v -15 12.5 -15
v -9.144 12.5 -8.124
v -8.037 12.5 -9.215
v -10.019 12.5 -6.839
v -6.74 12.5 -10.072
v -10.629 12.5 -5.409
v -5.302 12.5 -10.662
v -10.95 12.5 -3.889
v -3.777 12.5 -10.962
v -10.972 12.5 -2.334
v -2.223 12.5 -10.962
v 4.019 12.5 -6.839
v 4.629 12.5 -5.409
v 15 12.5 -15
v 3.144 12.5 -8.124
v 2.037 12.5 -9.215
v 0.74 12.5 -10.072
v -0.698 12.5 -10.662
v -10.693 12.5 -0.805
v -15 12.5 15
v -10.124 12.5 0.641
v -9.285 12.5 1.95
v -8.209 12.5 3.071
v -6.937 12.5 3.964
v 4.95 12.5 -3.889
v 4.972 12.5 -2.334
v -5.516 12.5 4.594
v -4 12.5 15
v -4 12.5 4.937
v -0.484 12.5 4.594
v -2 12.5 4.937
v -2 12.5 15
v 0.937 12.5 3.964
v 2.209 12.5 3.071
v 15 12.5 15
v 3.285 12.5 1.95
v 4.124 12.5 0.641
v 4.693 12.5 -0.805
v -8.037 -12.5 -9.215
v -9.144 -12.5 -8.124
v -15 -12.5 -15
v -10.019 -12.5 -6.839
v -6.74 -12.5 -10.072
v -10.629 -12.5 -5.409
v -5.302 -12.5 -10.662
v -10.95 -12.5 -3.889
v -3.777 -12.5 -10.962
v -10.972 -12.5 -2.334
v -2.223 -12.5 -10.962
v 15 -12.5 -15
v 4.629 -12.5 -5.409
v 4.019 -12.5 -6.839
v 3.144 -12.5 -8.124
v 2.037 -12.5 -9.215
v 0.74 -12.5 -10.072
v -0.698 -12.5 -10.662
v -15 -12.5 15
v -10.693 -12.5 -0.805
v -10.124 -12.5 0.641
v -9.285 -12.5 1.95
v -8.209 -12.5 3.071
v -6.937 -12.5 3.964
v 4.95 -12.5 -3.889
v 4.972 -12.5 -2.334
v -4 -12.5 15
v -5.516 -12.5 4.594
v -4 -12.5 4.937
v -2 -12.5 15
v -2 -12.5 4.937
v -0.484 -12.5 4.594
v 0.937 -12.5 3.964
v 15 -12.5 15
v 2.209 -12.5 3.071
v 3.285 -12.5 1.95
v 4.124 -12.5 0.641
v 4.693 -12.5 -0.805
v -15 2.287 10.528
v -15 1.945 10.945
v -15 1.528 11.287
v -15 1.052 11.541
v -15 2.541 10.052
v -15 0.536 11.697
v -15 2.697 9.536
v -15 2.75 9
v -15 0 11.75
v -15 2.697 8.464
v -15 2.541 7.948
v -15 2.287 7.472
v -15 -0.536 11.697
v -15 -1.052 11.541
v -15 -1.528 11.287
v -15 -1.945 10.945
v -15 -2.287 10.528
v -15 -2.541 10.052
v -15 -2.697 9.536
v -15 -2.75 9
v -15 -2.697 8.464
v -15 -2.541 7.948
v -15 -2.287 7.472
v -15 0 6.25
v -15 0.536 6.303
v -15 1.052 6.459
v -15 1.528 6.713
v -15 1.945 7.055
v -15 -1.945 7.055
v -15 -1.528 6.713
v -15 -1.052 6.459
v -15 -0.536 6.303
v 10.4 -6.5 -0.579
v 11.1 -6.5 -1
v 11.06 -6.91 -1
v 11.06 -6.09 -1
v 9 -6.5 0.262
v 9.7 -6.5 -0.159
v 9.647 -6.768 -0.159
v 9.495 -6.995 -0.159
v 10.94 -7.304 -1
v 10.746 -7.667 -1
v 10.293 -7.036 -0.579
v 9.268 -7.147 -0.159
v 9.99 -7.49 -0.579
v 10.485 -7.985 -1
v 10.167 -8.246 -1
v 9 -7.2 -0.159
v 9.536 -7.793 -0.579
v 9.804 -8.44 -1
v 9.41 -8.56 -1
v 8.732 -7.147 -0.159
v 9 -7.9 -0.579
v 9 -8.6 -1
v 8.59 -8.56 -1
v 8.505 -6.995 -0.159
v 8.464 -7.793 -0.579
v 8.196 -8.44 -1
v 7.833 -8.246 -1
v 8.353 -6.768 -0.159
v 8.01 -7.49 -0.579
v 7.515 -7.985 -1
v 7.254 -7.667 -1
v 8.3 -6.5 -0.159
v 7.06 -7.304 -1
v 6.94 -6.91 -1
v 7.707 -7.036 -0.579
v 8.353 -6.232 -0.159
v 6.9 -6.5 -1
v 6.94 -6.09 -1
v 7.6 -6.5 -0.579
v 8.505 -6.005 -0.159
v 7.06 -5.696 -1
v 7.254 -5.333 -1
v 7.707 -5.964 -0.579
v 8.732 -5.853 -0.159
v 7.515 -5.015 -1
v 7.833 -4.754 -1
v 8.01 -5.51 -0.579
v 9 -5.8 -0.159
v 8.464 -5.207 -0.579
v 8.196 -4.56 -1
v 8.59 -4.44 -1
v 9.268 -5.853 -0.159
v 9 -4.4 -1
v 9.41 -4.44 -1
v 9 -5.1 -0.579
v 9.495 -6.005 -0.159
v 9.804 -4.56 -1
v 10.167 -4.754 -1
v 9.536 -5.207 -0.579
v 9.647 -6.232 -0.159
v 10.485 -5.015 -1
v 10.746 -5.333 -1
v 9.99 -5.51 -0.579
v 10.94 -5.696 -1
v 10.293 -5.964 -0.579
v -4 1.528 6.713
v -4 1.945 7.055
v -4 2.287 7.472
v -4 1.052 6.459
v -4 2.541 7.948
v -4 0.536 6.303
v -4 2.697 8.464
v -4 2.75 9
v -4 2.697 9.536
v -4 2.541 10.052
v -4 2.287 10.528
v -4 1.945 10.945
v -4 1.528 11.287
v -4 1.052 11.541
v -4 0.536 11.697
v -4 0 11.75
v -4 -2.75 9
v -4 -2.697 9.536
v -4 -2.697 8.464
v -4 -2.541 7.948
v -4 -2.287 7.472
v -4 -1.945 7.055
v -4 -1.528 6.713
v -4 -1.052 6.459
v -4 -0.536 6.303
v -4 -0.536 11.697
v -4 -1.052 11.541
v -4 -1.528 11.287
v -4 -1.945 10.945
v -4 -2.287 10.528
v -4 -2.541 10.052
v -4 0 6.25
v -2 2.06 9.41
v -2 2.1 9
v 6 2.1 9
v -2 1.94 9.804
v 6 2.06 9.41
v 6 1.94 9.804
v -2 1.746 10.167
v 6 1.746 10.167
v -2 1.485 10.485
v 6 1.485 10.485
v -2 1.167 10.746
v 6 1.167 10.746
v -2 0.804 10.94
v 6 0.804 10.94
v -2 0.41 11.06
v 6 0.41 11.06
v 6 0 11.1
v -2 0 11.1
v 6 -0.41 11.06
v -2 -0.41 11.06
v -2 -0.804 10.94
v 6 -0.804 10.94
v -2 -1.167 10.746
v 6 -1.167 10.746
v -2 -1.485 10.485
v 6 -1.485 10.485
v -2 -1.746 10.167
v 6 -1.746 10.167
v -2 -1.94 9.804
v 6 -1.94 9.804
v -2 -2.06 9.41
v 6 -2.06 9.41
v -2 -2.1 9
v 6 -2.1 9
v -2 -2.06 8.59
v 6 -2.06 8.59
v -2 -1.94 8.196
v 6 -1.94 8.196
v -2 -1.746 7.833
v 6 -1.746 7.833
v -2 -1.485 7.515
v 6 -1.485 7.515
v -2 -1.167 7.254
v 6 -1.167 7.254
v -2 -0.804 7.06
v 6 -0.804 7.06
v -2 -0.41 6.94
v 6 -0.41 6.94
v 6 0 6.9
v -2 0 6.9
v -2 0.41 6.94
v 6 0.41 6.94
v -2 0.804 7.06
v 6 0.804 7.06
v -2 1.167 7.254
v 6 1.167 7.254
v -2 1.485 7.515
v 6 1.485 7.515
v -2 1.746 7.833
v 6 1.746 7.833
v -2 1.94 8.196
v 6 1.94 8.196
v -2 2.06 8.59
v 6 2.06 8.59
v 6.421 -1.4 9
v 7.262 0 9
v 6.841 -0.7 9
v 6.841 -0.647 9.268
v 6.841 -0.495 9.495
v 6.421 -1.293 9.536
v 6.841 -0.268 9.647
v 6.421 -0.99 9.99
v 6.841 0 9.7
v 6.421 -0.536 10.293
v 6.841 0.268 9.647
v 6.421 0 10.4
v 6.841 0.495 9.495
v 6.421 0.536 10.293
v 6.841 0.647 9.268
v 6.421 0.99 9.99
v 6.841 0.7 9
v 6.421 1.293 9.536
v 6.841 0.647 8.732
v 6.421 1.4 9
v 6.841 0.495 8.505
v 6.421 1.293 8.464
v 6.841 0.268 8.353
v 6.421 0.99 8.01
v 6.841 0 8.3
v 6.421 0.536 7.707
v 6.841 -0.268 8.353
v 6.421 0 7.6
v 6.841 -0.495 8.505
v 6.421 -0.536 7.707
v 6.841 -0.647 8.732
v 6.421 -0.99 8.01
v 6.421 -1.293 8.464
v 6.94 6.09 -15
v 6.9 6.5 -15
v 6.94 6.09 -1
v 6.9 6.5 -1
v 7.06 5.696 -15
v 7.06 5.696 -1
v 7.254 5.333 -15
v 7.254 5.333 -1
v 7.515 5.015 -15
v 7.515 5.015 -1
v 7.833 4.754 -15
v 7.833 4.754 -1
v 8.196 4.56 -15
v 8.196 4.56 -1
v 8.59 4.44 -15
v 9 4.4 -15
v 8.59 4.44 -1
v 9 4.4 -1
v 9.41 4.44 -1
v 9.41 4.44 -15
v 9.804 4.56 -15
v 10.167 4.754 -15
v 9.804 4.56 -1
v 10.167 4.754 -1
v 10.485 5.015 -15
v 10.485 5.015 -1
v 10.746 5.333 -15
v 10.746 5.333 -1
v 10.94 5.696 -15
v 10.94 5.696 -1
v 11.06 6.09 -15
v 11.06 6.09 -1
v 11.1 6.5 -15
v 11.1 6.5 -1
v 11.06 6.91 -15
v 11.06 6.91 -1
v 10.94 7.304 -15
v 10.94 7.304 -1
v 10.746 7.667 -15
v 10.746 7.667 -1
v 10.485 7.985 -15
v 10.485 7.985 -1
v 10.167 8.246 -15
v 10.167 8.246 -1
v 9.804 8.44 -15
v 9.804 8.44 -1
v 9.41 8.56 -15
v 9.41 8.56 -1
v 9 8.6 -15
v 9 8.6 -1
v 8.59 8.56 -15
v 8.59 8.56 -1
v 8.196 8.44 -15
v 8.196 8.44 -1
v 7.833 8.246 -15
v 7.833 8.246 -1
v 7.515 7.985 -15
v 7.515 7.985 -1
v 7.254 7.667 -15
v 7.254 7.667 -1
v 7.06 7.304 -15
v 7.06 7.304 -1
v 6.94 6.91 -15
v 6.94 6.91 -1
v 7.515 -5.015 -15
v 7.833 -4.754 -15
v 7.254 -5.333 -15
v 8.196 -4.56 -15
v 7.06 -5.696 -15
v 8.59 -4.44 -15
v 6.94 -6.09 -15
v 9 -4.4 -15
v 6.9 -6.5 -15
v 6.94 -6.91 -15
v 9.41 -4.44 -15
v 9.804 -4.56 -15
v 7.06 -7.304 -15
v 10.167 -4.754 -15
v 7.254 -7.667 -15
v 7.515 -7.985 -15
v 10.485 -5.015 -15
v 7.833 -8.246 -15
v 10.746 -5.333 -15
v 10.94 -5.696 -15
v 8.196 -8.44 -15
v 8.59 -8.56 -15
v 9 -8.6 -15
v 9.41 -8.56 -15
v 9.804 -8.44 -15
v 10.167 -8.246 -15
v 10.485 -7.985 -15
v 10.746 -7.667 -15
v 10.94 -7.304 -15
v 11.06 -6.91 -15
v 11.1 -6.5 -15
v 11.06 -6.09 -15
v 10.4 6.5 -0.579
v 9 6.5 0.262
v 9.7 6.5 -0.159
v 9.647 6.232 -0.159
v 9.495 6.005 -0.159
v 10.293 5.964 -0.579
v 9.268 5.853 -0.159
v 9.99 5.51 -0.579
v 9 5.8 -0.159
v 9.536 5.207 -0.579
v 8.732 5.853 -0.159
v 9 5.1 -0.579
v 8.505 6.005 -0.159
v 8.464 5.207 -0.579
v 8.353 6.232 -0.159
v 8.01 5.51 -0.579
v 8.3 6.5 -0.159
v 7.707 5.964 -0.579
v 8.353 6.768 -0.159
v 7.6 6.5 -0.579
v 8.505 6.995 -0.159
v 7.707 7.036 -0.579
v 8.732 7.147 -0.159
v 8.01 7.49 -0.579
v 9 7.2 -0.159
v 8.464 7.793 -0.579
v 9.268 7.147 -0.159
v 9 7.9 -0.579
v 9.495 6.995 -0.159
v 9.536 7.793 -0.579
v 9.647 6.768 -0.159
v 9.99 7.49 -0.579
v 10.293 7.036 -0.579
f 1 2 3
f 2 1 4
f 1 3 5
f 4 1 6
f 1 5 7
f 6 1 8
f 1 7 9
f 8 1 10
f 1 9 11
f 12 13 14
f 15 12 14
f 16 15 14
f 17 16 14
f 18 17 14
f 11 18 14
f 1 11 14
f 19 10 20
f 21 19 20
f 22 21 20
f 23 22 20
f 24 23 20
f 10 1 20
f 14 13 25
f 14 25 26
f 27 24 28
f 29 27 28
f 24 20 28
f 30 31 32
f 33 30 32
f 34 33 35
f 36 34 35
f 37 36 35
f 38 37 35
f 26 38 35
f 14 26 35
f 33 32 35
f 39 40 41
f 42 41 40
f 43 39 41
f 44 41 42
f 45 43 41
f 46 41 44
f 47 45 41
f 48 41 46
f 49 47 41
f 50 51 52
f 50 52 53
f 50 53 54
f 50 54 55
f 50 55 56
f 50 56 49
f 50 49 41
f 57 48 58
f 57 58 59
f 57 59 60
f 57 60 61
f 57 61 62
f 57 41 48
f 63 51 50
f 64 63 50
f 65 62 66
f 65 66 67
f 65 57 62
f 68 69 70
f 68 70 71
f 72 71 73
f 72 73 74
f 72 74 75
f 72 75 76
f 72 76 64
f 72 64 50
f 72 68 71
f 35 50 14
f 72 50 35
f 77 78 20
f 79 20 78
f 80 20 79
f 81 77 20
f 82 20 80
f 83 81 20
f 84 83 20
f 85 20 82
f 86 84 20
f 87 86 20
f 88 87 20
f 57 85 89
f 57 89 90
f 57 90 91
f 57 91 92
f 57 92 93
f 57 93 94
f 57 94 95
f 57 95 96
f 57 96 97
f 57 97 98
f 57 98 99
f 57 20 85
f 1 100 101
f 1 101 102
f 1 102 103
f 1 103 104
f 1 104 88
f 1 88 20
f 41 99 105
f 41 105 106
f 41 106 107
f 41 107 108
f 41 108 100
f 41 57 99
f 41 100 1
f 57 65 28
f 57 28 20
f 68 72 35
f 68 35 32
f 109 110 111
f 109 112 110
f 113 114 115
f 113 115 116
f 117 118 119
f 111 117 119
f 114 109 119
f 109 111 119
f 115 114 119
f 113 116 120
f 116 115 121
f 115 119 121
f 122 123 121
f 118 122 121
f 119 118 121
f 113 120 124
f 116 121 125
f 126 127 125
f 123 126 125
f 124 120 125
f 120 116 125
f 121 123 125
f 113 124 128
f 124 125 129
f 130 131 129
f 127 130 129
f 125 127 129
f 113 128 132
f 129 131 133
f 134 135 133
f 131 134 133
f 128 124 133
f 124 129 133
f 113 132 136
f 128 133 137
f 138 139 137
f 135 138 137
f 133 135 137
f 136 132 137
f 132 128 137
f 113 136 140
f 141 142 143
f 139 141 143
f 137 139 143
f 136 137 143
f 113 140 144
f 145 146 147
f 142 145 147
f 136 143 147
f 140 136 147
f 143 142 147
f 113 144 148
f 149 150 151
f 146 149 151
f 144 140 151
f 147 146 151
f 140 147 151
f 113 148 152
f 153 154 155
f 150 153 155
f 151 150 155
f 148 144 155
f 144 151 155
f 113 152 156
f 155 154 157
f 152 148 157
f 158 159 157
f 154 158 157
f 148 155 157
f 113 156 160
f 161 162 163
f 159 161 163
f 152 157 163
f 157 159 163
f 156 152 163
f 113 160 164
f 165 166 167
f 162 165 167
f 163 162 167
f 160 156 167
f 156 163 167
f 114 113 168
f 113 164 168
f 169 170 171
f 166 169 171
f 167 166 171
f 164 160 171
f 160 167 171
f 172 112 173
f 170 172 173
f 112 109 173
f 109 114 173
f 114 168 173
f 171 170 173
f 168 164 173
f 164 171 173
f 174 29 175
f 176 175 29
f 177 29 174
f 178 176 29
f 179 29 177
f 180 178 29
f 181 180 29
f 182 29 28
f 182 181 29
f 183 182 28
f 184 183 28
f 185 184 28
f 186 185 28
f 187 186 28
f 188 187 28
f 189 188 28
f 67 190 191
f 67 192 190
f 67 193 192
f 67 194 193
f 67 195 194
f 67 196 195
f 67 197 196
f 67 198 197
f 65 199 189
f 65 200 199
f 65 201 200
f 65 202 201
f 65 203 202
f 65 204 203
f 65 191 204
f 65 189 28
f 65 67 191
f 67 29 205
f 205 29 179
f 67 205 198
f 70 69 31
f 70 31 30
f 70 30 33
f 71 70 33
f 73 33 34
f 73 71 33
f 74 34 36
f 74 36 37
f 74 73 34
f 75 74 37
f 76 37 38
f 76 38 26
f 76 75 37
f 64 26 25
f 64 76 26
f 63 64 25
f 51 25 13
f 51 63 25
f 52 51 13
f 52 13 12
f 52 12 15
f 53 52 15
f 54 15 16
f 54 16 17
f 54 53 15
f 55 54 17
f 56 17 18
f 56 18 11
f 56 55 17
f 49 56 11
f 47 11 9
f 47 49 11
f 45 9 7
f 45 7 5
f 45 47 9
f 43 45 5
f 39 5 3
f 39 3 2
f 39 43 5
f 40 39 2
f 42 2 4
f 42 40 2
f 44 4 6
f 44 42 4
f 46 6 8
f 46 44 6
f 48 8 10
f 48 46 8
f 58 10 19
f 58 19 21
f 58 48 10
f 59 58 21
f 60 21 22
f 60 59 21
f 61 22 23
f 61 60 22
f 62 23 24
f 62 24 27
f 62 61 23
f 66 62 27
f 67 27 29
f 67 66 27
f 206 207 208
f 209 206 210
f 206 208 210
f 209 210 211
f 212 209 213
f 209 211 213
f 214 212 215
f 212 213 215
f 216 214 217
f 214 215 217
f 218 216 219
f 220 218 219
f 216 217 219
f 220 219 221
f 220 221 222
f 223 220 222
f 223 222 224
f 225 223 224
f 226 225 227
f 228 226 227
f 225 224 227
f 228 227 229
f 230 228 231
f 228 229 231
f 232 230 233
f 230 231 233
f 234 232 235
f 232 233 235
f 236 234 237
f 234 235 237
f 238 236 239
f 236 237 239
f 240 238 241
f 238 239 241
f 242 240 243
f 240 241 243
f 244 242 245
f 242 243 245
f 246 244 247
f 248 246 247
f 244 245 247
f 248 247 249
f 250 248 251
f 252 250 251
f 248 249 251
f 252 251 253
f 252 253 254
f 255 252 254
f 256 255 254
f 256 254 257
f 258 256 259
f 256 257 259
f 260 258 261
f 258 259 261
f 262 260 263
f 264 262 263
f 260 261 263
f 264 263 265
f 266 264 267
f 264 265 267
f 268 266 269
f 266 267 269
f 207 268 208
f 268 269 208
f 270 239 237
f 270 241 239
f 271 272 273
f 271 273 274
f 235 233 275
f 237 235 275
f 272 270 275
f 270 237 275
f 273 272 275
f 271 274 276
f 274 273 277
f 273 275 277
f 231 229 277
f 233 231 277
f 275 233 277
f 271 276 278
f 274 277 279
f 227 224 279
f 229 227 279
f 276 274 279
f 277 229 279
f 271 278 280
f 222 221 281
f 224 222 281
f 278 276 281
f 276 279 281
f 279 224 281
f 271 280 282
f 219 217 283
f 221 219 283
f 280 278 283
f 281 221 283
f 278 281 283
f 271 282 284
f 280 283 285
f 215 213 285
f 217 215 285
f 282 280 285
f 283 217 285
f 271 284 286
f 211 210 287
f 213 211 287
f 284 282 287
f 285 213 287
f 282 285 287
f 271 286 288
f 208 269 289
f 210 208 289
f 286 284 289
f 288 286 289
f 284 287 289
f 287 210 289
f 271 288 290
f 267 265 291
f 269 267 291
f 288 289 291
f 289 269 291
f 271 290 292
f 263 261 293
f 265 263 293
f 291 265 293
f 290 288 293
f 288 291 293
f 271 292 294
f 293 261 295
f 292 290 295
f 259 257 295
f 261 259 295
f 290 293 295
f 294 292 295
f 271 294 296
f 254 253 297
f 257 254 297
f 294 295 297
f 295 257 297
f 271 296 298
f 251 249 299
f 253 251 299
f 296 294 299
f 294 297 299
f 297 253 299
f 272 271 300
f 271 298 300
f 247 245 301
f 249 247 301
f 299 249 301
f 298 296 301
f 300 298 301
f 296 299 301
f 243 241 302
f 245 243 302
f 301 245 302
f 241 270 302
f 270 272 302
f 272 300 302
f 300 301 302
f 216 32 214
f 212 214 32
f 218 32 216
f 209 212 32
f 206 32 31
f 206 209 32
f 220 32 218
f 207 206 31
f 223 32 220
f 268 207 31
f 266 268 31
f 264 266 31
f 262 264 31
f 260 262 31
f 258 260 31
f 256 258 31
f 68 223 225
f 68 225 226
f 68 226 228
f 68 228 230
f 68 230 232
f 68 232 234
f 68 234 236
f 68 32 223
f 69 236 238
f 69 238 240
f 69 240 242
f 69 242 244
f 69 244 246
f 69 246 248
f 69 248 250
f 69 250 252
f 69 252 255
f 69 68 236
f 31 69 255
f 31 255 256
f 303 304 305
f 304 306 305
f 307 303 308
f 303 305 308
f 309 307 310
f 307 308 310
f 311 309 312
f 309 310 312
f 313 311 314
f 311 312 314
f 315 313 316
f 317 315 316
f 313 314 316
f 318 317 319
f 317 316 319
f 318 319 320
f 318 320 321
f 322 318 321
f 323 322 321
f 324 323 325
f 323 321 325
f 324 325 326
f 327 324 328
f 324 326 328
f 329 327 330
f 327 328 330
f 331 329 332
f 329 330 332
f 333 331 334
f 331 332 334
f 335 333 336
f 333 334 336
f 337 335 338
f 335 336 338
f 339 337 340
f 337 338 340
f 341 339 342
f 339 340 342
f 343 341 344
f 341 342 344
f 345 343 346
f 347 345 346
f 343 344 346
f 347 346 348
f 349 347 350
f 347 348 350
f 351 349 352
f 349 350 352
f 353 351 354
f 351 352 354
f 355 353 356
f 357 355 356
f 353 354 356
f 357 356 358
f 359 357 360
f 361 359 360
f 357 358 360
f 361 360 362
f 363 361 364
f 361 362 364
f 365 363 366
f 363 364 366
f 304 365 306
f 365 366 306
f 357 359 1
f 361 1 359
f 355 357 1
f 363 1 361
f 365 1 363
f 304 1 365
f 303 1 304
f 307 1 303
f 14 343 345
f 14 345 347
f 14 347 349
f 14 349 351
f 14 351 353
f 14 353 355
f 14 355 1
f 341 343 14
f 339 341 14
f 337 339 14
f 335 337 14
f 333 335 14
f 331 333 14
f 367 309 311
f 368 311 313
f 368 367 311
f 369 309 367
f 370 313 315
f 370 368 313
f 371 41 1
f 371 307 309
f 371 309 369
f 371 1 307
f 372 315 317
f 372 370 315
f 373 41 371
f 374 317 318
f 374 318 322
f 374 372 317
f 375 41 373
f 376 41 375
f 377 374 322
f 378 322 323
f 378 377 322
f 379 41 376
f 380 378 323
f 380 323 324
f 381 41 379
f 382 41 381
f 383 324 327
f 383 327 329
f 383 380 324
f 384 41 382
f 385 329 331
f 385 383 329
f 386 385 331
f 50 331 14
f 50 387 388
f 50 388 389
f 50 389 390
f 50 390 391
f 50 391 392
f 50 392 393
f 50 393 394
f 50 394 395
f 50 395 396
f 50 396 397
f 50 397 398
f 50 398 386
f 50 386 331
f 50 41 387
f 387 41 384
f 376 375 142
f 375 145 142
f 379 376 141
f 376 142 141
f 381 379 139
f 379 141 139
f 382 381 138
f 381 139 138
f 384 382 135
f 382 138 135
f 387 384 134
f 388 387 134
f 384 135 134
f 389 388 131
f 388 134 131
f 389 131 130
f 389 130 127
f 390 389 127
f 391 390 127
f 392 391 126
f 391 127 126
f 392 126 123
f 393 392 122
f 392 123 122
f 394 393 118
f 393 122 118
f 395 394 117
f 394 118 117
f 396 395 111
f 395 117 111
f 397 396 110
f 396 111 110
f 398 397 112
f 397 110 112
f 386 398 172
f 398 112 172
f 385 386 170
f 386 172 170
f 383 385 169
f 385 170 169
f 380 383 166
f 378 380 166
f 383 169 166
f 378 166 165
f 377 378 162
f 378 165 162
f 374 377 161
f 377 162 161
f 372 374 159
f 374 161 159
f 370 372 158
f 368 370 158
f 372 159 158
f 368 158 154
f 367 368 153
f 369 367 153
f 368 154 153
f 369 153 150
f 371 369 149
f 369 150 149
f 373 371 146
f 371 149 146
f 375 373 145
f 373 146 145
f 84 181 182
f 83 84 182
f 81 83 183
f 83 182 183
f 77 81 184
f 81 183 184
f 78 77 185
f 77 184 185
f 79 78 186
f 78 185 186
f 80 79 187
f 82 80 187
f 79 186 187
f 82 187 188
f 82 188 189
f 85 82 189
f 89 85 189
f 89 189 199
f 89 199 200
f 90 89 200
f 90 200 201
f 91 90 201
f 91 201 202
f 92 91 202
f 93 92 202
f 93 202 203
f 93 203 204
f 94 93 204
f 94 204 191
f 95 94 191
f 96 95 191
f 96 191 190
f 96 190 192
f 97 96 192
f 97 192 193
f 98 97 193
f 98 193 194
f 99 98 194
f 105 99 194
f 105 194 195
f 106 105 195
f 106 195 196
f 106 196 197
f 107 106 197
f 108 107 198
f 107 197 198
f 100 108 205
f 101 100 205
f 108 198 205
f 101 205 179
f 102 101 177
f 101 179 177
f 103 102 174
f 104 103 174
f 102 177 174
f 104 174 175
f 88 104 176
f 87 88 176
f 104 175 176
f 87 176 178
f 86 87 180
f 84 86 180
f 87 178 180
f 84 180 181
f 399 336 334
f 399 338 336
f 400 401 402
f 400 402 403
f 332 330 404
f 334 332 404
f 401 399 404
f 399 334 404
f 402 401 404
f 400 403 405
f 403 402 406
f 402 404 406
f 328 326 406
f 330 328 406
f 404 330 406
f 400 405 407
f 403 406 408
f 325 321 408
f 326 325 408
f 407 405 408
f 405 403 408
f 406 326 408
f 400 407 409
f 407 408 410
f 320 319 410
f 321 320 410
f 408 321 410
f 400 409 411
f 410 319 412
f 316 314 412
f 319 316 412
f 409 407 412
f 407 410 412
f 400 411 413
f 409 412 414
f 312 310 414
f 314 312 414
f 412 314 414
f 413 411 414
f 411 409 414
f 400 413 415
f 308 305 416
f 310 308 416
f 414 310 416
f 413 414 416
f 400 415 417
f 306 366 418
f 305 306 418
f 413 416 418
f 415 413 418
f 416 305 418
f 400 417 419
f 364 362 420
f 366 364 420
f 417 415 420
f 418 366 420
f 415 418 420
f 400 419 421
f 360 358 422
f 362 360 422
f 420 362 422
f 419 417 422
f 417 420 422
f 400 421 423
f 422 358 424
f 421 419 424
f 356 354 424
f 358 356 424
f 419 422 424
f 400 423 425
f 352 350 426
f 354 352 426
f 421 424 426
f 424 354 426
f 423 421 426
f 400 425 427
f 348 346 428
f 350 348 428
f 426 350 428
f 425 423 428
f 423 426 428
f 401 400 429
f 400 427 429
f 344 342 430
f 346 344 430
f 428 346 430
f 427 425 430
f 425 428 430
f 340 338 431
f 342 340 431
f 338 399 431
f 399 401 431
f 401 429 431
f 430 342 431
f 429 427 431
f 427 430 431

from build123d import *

# Parameters (mm, degrees)
F1_DEPTH = 12.5
F3_D     = 5.5
F3_DEPTH = 12
F3_TIP   = 1.6523667023
F5_D     = 4.2
F5_DEPTH = 8
F5_TIP   = 1.2618073
F7_D     = 4.2
F7_DEPTH = 14
F7_TIP   = 1.2618073


with BuildPart() as f1:
    # F0 (on Front) → F1 (new body, symmetric)
    with BuildSketch(Plane.XZ):
        with BuildLine():
            Line((15, -15), (15, 15))
            Line((15, 15), (-2, 15))
            Line((-2, 15), (-2, 4.9372539332))
            ThreePointArc((-2, 4.9372539332), (-3, -11), (-4, 4.9372539332))
            Line((-4, 4.9372539332), (-4, 15))
            Line((-4, 15), (-15, 15))
            Line((-15, 15), (-15, -15))
            Line((-15, -15), (15, -15))
        make_face()
    extrude(amount=F1_DEPTH, both=True)

    # F3
    with Locations(Plane(origin=(-15, 0, 0), x_dir=(0, -1, 0), z_dir=(-1, 0, 0))):
        with Locations((0, 9)):
            Hole(F3_D / 2, depth=F3_DEPTH)
            with Locations((0, 0, -(F3_DEPTH + F3_TIP / 2))):  # 118° drill point
                Cone(0, F3_D / 2, F3_TIP, mode=Mode.SUBTRACT)

    # F5
    with Locations(Plane(origin=(-2, 0, 0), x_dir=(0, -1, 0), z_dir=(-1, 0, 0))):
        with Locations((0, 9)):
            Hole(F5_D / 2, depth=F5_DEPTH)
            with Locations((0, 0, -(F5_DEPTH + F5_TIP / 2))):  # 118° drill point
                Cone(0, F5_D / 2, F5_TIP, mode=Mode.SUBTRACT)

    # F7
    with Locations(Plane(origin=(0, 0, -15), x_dir=(1, 0, 0), z_dir=(0, 0, -1))):
        with Locations((9, 6.5), (9, -6.5)):
            Hole(F7_D / 2, depth=F7_DEPTH)
            with Locations((0, 0, -(F7_DEPTH + F7_TIP / 2))):  # 118° drill point
                Cone(0, F7_D / 2, F7_TIP, mode=Mode.SUBTRACT)


solid = f1.part
